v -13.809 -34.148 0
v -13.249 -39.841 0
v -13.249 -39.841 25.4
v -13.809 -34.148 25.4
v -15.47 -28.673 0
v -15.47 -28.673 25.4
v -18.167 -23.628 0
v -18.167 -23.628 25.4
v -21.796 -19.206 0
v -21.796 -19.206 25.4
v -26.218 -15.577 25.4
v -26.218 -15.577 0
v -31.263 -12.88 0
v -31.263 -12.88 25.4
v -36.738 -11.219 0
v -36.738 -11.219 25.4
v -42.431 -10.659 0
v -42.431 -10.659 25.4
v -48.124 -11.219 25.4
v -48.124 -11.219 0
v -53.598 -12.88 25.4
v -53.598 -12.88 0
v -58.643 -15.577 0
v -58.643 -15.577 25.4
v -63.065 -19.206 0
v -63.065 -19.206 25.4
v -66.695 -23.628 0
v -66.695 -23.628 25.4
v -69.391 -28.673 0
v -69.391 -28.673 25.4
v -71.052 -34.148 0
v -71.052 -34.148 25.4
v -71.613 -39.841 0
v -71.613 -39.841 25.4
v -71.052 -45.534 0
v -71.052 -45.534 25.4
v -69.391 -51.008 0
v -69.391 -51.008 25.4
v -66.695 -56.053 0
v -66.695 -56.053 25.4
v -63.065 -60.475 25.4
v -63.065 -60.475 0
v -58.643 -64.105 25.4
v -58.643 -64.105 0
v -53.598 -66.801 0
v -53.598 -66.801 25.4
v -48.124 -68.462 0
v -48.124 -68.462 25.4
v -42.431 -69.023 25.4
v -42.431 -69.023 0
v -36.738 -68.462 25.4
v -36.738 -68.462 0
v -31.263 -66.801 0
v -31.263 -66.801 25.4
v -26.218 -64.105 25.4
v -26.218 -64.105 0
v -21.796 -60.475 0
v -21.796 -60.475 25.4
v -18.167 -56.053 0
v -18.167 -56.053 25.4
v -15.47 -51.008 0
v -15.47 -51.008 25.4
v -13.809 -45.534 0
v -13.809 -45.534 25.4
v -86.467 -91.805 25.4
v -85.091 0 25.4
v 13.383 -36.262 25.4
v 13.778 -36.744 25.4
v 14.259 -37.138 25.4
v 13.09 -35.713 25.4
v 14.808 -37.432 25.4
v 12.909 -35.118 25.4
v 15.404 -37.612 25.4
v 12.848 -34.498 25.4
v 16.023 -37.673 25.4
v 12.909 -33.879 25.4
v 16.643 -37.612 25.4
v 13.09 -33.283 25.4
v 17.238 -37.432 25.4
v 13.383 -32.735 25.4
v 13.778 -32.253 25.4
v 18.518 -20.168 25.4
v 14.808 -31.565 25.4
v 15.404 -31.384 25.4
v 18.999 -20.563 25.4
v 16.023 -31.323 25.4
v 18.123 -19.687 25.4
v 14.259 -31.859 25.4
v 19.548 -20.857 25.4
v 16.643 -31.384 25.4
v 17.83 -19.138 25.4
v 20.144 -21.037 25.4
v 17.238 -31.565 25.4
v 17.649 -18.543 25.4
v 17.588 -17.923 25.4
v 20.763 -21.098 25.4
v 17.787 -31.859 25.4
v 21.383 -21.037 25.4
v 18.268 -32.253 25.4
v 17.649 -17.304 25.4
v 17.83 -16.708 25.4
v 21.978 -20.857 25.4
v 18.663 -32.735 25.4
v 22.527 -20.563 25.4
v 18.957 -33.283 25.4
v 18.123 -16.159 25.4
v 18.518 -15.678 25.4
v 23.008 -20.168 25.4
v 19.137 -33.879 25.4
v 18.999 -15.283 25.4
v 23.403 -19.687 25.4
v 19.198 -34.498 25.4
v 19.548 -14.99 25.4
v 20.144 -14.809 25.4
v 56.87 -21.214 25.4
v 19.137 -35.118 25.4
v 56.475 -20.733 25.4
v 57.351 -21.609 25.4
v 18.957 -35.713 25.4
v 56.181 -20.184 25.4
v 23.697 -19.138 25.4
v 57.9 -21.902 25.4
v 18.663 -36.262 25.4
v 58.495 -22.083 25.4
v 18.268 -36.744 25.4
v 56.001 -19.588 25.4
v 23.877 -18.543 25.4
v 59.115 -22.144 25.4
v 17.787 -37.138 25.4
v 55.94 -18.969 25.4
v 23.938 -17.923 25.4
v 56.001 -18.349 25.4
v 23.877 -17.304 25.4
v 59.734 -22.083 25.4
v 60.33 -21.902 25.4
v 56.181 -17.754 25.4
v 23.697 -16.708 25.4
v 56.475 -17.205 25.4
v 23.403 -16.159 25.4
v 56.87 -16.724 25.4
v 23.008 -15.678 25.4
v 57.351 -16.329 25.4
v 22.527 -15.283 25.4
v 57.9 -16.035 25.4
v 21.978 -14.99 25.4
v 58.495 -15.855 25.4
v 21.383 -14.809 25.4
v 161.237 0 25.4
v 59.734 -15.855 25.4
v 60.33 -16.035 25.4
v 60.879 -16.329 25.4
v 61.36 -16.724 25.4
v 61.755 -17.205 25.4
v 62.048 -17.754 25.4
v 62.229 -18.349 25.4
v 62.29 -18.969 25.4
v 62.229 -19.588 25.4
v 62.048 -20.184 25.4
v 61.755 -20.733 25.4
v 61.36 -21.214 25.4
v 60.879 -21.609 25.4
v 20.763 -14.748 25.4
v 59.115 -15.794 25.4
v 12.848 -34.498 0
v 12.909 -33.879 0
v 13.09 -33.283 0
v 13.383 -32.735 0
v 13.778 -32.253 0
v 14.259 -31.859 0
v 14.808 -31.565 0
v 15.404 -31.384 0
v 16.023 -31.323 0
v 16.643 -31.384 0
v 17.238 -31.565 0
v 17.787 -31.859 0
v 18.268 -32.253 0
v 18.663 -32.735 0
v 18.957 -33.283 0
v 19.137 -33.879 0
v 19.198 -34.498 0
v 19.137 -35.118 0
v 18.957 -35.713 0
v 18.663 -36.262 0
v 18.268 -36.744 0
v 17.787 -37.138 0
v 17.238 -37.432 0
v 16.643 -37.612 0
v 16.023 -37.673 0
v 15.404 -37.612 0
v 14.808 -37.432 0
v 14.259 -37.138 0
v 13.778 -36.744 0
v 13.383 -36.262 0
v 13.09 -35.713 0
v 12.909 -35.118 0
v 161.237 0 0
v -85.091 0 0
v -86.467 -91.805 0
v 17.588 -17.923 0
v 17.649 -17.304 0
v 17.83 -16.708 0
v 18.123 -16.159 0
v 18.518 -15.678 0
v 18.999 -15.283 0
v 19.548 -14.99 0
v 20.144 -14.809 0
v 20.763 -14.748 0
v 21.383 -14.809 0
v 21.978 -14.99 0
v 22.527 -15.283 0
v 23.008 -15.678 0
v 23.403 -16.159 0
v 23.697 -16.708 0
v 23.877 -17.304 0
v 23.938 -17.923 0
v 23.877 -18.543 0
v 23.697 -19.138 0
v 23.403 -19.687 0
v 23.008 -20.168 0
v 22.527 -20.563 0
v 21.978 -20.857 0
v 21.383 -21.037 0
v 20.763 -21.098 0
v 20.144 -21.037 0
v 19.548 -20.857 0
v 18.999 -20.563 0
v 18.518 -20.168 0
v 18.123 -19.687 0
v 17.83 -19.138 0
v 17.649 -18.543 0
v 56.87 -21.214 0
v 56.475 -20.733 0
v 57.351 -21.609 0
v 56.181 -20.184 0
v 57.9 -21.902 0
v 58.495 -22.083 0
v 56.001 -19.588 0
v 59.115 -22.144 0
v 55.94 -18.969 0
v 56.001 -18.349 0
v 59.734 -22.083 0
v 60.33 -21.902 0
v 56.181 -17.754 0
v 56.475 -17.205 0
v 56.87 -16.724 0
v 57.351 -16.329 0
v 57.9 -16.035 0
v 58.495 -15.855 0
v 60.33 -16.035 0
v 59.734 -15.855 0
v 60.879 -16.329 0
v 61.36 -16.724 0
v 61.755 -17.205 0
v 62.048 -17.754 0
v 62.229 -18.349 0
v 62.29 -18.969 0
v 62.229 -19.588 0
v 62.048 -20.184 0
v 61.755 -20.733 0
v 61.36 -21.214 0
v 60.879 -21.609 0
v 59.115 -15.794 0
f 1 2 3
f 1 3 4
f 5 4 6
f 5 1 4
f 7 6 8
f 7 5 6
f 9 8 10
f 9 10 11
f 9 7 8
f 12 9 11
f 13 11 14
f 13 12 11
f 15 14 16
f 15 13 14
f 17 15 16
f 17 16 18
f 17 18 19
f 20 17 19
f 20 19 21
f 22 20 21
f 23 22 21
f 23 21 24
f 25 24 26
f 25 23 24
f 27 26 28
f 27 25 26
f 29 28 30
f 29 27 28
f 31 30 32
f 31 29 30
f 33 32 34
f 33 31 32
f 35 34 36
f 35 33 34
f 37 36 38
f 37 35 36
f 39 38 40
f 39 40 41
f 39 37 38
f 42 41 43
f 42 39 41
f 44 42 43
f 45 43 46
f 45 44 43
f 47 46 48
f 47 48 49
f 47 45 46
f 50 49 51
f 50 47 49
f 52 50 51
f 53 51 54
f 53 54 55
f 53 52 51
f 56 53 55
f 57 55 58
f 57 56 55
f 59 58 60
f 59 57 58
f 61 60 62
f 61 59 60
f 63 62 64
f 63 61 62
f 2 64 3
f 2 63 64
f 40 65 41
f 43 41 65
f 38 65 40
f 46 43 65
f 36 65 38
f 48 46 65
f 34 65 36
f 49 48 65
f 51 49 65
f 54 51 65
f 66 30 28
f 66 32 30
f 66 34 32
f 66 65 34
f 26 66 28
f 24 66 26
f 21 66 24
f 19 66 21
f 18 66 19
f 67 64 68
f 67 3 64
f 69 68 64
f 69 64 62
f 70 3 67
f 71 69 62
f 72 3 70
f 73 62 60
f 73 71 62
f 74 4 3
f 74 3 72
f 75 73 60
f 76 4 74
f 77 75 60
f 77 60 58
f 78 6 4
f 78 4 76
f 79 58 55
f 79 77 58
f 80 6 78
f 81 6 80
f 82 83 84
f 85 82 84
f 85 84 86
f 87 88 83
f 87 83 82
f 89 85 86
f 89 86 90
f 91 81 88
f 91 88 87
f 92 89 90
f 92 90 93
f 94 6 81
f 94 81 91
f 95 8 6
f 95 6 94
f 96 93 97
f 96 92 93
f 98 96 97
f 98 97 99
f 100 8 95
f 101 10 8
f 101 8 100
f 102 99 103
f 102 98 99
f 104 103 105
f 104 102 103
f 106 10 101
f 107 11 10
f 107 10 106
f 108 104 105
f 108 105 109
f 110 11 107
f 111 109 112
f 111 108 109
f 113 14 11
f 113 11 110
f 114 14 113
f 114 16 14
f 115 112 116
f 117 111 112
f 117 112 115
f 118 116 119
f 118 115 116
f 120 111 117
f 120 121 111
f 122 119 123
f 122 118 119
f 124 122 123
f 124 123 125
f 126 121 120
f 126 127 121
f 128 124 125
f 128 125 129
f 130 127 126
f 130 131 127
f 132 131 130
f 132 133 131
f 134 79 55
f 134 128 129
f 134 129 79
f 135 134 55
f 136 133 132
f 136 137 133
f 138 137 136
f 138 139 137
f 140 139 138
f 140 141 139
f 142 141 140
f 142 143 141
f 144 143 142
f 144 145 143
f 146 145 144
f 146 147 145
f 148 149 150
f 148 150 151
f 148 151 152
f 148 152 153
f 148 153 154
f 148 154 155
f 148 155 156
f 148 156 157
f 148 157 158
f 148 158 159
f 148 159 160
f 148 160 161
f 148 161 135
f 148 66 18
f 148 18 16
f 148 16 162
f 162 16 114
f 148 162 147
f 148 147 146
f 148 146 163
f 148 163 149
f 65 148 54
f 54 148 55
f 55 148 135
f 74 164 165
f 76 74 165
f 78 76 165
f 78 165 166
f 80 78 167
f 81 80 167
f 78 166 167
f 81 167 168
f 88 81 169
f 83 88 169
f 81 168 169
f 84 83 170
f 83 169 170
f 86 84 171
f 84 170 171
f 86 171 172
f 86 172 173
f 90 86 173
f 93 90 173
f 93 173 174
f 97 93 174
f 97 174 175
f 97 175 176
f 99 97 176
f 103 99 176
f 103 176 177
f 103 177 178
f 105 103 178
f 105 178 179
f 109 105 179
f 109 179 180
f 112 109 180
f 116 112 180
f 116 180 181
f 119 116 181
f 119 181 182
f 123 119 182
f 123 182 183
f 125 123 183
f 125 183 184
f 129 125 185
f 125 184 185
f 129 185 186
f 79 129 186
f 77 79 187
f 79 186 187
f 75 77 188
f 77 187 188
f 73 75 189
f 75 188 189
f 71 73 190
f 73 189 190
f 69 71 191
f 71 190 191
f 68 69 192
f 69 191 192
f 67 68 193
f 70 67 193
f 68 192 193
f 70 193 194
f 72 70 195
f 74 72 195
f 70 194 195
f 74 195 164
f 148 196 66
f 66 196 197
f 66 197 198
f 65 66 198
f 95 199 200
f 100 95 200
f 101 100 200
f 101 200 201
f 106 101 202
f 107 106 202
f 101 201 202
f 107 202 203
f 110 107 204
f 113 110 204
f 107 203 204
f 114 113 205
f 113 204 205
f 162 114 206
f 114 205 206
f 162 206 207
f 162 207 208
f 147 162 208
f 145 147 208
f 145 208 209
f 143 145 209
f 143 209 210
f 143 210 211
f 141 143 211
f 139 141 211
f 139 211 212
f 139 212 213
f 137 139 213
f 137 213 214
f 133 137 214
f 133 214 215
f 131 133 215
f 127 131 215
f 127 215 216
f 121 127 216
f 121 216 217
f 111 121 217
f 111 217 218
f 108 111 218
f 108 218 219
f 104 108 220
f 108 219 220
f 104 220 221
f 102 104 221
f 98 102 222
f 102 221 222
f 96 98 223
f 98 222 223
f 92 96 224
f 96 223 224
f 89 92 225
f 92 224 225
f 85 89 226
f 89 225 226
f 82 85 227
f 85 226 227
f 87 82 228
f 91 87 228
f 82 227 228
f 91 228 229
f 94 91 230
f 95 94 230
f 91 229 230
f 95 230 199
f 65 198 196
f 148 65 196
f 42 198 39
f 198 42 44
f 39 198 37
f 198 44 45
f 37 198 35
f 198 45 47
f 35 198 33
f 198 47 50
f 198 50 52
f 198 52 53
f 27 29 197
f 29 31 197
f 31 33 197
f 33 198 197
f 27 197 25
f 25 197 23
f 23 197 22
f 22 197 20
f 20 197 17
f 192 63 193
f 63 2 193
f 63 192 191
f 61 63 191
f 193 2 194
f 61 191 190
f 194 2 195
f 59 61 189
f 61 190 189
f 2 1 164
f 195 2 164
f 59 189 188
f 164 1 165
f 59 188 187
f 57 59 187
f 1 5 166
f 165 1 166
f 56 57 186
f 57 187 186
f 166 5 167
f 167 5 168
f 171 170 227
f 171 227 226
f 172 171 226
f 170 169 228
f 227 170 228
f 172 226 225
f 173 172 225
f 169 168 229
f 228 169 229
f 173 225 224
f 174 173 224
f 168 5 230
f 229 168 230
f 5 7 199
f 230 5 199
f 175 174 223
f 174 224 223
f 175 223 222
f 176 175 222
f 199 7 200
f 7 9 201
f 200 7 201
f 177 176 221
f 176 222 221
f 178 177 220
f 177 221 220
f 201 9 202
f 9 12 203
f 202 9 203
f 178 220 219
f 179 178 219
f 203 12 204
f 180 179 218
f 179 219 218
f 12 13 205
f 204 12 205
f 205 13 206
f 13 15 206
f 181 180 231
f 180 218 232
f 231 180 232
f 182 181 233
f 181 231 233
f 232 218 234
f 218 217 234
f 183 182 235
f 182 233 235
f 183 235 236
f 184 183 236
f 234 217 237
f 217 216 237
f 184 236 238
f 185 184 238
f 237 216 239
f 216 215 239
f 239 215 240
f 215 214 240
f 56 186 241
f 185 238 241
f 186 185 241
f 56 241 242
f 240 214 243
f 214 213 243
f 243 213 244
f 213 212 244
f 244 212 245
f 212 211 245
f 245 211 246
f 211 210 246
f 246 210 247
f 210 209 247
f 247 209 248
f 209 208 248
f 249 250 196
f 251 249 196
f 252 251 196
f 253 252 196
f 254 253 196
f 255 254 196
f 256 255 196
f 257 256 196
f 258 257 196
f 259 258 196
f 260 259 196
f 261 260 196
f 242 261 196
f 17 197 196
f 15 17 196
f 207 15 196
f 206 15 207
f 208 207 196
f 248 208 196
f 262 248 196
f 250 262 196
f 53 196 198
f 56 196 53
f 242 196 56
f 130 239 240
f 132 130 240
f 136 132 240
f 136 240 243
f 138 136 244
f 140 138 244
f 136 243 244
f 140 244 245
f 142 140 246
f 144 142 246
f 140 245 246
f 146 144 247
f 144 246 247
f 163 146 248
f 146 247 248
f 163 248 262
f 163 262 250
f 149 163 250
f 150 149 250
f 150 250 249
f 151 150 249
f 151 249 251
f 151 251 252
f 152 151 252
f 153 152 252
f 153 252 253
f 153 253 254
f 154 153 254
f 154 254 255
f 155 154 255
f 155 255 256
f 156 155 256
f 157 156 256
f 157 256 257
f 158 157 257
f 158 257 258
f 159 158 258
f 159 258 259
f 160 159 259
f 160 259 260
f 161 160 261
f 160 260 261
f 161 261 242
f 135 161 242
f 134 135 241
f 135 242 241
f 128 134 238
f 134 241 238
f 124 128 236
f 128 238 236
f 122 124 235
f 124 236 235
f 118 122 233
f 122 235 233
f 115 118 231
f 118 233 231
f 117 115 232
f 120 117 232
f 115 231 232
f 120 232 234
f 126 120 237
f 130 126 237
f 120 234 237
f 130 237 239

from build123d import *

# Parameters (mm, degrees)
F0_R     = 29.182002
F1_DEPTH = 25.4
F3_D     = 6.35


with BuildPart() as f1:
    # F0 (on Top) → F1 (new body)
    with BuildSketch(Plane.XY):
        Polygon((161.236733, 0), (-85.090756, 0), (-86.466879, -91.804653), align=None)
        with Locations((-42.430699, -39.840698)):
            Circle(F0_R, mode=Mode.SUBTRACT)
    extrude(amount=F1_DEPTH)

    # F3 (through all)
    with Locations(Plane.XY.offset(25.4)):
        with Locations((20.763323, -17.923191), (16.023301, -34.498475), (59.114777, -18.968618)):
            Hole(F3_D / 2)


solid = f1.part
